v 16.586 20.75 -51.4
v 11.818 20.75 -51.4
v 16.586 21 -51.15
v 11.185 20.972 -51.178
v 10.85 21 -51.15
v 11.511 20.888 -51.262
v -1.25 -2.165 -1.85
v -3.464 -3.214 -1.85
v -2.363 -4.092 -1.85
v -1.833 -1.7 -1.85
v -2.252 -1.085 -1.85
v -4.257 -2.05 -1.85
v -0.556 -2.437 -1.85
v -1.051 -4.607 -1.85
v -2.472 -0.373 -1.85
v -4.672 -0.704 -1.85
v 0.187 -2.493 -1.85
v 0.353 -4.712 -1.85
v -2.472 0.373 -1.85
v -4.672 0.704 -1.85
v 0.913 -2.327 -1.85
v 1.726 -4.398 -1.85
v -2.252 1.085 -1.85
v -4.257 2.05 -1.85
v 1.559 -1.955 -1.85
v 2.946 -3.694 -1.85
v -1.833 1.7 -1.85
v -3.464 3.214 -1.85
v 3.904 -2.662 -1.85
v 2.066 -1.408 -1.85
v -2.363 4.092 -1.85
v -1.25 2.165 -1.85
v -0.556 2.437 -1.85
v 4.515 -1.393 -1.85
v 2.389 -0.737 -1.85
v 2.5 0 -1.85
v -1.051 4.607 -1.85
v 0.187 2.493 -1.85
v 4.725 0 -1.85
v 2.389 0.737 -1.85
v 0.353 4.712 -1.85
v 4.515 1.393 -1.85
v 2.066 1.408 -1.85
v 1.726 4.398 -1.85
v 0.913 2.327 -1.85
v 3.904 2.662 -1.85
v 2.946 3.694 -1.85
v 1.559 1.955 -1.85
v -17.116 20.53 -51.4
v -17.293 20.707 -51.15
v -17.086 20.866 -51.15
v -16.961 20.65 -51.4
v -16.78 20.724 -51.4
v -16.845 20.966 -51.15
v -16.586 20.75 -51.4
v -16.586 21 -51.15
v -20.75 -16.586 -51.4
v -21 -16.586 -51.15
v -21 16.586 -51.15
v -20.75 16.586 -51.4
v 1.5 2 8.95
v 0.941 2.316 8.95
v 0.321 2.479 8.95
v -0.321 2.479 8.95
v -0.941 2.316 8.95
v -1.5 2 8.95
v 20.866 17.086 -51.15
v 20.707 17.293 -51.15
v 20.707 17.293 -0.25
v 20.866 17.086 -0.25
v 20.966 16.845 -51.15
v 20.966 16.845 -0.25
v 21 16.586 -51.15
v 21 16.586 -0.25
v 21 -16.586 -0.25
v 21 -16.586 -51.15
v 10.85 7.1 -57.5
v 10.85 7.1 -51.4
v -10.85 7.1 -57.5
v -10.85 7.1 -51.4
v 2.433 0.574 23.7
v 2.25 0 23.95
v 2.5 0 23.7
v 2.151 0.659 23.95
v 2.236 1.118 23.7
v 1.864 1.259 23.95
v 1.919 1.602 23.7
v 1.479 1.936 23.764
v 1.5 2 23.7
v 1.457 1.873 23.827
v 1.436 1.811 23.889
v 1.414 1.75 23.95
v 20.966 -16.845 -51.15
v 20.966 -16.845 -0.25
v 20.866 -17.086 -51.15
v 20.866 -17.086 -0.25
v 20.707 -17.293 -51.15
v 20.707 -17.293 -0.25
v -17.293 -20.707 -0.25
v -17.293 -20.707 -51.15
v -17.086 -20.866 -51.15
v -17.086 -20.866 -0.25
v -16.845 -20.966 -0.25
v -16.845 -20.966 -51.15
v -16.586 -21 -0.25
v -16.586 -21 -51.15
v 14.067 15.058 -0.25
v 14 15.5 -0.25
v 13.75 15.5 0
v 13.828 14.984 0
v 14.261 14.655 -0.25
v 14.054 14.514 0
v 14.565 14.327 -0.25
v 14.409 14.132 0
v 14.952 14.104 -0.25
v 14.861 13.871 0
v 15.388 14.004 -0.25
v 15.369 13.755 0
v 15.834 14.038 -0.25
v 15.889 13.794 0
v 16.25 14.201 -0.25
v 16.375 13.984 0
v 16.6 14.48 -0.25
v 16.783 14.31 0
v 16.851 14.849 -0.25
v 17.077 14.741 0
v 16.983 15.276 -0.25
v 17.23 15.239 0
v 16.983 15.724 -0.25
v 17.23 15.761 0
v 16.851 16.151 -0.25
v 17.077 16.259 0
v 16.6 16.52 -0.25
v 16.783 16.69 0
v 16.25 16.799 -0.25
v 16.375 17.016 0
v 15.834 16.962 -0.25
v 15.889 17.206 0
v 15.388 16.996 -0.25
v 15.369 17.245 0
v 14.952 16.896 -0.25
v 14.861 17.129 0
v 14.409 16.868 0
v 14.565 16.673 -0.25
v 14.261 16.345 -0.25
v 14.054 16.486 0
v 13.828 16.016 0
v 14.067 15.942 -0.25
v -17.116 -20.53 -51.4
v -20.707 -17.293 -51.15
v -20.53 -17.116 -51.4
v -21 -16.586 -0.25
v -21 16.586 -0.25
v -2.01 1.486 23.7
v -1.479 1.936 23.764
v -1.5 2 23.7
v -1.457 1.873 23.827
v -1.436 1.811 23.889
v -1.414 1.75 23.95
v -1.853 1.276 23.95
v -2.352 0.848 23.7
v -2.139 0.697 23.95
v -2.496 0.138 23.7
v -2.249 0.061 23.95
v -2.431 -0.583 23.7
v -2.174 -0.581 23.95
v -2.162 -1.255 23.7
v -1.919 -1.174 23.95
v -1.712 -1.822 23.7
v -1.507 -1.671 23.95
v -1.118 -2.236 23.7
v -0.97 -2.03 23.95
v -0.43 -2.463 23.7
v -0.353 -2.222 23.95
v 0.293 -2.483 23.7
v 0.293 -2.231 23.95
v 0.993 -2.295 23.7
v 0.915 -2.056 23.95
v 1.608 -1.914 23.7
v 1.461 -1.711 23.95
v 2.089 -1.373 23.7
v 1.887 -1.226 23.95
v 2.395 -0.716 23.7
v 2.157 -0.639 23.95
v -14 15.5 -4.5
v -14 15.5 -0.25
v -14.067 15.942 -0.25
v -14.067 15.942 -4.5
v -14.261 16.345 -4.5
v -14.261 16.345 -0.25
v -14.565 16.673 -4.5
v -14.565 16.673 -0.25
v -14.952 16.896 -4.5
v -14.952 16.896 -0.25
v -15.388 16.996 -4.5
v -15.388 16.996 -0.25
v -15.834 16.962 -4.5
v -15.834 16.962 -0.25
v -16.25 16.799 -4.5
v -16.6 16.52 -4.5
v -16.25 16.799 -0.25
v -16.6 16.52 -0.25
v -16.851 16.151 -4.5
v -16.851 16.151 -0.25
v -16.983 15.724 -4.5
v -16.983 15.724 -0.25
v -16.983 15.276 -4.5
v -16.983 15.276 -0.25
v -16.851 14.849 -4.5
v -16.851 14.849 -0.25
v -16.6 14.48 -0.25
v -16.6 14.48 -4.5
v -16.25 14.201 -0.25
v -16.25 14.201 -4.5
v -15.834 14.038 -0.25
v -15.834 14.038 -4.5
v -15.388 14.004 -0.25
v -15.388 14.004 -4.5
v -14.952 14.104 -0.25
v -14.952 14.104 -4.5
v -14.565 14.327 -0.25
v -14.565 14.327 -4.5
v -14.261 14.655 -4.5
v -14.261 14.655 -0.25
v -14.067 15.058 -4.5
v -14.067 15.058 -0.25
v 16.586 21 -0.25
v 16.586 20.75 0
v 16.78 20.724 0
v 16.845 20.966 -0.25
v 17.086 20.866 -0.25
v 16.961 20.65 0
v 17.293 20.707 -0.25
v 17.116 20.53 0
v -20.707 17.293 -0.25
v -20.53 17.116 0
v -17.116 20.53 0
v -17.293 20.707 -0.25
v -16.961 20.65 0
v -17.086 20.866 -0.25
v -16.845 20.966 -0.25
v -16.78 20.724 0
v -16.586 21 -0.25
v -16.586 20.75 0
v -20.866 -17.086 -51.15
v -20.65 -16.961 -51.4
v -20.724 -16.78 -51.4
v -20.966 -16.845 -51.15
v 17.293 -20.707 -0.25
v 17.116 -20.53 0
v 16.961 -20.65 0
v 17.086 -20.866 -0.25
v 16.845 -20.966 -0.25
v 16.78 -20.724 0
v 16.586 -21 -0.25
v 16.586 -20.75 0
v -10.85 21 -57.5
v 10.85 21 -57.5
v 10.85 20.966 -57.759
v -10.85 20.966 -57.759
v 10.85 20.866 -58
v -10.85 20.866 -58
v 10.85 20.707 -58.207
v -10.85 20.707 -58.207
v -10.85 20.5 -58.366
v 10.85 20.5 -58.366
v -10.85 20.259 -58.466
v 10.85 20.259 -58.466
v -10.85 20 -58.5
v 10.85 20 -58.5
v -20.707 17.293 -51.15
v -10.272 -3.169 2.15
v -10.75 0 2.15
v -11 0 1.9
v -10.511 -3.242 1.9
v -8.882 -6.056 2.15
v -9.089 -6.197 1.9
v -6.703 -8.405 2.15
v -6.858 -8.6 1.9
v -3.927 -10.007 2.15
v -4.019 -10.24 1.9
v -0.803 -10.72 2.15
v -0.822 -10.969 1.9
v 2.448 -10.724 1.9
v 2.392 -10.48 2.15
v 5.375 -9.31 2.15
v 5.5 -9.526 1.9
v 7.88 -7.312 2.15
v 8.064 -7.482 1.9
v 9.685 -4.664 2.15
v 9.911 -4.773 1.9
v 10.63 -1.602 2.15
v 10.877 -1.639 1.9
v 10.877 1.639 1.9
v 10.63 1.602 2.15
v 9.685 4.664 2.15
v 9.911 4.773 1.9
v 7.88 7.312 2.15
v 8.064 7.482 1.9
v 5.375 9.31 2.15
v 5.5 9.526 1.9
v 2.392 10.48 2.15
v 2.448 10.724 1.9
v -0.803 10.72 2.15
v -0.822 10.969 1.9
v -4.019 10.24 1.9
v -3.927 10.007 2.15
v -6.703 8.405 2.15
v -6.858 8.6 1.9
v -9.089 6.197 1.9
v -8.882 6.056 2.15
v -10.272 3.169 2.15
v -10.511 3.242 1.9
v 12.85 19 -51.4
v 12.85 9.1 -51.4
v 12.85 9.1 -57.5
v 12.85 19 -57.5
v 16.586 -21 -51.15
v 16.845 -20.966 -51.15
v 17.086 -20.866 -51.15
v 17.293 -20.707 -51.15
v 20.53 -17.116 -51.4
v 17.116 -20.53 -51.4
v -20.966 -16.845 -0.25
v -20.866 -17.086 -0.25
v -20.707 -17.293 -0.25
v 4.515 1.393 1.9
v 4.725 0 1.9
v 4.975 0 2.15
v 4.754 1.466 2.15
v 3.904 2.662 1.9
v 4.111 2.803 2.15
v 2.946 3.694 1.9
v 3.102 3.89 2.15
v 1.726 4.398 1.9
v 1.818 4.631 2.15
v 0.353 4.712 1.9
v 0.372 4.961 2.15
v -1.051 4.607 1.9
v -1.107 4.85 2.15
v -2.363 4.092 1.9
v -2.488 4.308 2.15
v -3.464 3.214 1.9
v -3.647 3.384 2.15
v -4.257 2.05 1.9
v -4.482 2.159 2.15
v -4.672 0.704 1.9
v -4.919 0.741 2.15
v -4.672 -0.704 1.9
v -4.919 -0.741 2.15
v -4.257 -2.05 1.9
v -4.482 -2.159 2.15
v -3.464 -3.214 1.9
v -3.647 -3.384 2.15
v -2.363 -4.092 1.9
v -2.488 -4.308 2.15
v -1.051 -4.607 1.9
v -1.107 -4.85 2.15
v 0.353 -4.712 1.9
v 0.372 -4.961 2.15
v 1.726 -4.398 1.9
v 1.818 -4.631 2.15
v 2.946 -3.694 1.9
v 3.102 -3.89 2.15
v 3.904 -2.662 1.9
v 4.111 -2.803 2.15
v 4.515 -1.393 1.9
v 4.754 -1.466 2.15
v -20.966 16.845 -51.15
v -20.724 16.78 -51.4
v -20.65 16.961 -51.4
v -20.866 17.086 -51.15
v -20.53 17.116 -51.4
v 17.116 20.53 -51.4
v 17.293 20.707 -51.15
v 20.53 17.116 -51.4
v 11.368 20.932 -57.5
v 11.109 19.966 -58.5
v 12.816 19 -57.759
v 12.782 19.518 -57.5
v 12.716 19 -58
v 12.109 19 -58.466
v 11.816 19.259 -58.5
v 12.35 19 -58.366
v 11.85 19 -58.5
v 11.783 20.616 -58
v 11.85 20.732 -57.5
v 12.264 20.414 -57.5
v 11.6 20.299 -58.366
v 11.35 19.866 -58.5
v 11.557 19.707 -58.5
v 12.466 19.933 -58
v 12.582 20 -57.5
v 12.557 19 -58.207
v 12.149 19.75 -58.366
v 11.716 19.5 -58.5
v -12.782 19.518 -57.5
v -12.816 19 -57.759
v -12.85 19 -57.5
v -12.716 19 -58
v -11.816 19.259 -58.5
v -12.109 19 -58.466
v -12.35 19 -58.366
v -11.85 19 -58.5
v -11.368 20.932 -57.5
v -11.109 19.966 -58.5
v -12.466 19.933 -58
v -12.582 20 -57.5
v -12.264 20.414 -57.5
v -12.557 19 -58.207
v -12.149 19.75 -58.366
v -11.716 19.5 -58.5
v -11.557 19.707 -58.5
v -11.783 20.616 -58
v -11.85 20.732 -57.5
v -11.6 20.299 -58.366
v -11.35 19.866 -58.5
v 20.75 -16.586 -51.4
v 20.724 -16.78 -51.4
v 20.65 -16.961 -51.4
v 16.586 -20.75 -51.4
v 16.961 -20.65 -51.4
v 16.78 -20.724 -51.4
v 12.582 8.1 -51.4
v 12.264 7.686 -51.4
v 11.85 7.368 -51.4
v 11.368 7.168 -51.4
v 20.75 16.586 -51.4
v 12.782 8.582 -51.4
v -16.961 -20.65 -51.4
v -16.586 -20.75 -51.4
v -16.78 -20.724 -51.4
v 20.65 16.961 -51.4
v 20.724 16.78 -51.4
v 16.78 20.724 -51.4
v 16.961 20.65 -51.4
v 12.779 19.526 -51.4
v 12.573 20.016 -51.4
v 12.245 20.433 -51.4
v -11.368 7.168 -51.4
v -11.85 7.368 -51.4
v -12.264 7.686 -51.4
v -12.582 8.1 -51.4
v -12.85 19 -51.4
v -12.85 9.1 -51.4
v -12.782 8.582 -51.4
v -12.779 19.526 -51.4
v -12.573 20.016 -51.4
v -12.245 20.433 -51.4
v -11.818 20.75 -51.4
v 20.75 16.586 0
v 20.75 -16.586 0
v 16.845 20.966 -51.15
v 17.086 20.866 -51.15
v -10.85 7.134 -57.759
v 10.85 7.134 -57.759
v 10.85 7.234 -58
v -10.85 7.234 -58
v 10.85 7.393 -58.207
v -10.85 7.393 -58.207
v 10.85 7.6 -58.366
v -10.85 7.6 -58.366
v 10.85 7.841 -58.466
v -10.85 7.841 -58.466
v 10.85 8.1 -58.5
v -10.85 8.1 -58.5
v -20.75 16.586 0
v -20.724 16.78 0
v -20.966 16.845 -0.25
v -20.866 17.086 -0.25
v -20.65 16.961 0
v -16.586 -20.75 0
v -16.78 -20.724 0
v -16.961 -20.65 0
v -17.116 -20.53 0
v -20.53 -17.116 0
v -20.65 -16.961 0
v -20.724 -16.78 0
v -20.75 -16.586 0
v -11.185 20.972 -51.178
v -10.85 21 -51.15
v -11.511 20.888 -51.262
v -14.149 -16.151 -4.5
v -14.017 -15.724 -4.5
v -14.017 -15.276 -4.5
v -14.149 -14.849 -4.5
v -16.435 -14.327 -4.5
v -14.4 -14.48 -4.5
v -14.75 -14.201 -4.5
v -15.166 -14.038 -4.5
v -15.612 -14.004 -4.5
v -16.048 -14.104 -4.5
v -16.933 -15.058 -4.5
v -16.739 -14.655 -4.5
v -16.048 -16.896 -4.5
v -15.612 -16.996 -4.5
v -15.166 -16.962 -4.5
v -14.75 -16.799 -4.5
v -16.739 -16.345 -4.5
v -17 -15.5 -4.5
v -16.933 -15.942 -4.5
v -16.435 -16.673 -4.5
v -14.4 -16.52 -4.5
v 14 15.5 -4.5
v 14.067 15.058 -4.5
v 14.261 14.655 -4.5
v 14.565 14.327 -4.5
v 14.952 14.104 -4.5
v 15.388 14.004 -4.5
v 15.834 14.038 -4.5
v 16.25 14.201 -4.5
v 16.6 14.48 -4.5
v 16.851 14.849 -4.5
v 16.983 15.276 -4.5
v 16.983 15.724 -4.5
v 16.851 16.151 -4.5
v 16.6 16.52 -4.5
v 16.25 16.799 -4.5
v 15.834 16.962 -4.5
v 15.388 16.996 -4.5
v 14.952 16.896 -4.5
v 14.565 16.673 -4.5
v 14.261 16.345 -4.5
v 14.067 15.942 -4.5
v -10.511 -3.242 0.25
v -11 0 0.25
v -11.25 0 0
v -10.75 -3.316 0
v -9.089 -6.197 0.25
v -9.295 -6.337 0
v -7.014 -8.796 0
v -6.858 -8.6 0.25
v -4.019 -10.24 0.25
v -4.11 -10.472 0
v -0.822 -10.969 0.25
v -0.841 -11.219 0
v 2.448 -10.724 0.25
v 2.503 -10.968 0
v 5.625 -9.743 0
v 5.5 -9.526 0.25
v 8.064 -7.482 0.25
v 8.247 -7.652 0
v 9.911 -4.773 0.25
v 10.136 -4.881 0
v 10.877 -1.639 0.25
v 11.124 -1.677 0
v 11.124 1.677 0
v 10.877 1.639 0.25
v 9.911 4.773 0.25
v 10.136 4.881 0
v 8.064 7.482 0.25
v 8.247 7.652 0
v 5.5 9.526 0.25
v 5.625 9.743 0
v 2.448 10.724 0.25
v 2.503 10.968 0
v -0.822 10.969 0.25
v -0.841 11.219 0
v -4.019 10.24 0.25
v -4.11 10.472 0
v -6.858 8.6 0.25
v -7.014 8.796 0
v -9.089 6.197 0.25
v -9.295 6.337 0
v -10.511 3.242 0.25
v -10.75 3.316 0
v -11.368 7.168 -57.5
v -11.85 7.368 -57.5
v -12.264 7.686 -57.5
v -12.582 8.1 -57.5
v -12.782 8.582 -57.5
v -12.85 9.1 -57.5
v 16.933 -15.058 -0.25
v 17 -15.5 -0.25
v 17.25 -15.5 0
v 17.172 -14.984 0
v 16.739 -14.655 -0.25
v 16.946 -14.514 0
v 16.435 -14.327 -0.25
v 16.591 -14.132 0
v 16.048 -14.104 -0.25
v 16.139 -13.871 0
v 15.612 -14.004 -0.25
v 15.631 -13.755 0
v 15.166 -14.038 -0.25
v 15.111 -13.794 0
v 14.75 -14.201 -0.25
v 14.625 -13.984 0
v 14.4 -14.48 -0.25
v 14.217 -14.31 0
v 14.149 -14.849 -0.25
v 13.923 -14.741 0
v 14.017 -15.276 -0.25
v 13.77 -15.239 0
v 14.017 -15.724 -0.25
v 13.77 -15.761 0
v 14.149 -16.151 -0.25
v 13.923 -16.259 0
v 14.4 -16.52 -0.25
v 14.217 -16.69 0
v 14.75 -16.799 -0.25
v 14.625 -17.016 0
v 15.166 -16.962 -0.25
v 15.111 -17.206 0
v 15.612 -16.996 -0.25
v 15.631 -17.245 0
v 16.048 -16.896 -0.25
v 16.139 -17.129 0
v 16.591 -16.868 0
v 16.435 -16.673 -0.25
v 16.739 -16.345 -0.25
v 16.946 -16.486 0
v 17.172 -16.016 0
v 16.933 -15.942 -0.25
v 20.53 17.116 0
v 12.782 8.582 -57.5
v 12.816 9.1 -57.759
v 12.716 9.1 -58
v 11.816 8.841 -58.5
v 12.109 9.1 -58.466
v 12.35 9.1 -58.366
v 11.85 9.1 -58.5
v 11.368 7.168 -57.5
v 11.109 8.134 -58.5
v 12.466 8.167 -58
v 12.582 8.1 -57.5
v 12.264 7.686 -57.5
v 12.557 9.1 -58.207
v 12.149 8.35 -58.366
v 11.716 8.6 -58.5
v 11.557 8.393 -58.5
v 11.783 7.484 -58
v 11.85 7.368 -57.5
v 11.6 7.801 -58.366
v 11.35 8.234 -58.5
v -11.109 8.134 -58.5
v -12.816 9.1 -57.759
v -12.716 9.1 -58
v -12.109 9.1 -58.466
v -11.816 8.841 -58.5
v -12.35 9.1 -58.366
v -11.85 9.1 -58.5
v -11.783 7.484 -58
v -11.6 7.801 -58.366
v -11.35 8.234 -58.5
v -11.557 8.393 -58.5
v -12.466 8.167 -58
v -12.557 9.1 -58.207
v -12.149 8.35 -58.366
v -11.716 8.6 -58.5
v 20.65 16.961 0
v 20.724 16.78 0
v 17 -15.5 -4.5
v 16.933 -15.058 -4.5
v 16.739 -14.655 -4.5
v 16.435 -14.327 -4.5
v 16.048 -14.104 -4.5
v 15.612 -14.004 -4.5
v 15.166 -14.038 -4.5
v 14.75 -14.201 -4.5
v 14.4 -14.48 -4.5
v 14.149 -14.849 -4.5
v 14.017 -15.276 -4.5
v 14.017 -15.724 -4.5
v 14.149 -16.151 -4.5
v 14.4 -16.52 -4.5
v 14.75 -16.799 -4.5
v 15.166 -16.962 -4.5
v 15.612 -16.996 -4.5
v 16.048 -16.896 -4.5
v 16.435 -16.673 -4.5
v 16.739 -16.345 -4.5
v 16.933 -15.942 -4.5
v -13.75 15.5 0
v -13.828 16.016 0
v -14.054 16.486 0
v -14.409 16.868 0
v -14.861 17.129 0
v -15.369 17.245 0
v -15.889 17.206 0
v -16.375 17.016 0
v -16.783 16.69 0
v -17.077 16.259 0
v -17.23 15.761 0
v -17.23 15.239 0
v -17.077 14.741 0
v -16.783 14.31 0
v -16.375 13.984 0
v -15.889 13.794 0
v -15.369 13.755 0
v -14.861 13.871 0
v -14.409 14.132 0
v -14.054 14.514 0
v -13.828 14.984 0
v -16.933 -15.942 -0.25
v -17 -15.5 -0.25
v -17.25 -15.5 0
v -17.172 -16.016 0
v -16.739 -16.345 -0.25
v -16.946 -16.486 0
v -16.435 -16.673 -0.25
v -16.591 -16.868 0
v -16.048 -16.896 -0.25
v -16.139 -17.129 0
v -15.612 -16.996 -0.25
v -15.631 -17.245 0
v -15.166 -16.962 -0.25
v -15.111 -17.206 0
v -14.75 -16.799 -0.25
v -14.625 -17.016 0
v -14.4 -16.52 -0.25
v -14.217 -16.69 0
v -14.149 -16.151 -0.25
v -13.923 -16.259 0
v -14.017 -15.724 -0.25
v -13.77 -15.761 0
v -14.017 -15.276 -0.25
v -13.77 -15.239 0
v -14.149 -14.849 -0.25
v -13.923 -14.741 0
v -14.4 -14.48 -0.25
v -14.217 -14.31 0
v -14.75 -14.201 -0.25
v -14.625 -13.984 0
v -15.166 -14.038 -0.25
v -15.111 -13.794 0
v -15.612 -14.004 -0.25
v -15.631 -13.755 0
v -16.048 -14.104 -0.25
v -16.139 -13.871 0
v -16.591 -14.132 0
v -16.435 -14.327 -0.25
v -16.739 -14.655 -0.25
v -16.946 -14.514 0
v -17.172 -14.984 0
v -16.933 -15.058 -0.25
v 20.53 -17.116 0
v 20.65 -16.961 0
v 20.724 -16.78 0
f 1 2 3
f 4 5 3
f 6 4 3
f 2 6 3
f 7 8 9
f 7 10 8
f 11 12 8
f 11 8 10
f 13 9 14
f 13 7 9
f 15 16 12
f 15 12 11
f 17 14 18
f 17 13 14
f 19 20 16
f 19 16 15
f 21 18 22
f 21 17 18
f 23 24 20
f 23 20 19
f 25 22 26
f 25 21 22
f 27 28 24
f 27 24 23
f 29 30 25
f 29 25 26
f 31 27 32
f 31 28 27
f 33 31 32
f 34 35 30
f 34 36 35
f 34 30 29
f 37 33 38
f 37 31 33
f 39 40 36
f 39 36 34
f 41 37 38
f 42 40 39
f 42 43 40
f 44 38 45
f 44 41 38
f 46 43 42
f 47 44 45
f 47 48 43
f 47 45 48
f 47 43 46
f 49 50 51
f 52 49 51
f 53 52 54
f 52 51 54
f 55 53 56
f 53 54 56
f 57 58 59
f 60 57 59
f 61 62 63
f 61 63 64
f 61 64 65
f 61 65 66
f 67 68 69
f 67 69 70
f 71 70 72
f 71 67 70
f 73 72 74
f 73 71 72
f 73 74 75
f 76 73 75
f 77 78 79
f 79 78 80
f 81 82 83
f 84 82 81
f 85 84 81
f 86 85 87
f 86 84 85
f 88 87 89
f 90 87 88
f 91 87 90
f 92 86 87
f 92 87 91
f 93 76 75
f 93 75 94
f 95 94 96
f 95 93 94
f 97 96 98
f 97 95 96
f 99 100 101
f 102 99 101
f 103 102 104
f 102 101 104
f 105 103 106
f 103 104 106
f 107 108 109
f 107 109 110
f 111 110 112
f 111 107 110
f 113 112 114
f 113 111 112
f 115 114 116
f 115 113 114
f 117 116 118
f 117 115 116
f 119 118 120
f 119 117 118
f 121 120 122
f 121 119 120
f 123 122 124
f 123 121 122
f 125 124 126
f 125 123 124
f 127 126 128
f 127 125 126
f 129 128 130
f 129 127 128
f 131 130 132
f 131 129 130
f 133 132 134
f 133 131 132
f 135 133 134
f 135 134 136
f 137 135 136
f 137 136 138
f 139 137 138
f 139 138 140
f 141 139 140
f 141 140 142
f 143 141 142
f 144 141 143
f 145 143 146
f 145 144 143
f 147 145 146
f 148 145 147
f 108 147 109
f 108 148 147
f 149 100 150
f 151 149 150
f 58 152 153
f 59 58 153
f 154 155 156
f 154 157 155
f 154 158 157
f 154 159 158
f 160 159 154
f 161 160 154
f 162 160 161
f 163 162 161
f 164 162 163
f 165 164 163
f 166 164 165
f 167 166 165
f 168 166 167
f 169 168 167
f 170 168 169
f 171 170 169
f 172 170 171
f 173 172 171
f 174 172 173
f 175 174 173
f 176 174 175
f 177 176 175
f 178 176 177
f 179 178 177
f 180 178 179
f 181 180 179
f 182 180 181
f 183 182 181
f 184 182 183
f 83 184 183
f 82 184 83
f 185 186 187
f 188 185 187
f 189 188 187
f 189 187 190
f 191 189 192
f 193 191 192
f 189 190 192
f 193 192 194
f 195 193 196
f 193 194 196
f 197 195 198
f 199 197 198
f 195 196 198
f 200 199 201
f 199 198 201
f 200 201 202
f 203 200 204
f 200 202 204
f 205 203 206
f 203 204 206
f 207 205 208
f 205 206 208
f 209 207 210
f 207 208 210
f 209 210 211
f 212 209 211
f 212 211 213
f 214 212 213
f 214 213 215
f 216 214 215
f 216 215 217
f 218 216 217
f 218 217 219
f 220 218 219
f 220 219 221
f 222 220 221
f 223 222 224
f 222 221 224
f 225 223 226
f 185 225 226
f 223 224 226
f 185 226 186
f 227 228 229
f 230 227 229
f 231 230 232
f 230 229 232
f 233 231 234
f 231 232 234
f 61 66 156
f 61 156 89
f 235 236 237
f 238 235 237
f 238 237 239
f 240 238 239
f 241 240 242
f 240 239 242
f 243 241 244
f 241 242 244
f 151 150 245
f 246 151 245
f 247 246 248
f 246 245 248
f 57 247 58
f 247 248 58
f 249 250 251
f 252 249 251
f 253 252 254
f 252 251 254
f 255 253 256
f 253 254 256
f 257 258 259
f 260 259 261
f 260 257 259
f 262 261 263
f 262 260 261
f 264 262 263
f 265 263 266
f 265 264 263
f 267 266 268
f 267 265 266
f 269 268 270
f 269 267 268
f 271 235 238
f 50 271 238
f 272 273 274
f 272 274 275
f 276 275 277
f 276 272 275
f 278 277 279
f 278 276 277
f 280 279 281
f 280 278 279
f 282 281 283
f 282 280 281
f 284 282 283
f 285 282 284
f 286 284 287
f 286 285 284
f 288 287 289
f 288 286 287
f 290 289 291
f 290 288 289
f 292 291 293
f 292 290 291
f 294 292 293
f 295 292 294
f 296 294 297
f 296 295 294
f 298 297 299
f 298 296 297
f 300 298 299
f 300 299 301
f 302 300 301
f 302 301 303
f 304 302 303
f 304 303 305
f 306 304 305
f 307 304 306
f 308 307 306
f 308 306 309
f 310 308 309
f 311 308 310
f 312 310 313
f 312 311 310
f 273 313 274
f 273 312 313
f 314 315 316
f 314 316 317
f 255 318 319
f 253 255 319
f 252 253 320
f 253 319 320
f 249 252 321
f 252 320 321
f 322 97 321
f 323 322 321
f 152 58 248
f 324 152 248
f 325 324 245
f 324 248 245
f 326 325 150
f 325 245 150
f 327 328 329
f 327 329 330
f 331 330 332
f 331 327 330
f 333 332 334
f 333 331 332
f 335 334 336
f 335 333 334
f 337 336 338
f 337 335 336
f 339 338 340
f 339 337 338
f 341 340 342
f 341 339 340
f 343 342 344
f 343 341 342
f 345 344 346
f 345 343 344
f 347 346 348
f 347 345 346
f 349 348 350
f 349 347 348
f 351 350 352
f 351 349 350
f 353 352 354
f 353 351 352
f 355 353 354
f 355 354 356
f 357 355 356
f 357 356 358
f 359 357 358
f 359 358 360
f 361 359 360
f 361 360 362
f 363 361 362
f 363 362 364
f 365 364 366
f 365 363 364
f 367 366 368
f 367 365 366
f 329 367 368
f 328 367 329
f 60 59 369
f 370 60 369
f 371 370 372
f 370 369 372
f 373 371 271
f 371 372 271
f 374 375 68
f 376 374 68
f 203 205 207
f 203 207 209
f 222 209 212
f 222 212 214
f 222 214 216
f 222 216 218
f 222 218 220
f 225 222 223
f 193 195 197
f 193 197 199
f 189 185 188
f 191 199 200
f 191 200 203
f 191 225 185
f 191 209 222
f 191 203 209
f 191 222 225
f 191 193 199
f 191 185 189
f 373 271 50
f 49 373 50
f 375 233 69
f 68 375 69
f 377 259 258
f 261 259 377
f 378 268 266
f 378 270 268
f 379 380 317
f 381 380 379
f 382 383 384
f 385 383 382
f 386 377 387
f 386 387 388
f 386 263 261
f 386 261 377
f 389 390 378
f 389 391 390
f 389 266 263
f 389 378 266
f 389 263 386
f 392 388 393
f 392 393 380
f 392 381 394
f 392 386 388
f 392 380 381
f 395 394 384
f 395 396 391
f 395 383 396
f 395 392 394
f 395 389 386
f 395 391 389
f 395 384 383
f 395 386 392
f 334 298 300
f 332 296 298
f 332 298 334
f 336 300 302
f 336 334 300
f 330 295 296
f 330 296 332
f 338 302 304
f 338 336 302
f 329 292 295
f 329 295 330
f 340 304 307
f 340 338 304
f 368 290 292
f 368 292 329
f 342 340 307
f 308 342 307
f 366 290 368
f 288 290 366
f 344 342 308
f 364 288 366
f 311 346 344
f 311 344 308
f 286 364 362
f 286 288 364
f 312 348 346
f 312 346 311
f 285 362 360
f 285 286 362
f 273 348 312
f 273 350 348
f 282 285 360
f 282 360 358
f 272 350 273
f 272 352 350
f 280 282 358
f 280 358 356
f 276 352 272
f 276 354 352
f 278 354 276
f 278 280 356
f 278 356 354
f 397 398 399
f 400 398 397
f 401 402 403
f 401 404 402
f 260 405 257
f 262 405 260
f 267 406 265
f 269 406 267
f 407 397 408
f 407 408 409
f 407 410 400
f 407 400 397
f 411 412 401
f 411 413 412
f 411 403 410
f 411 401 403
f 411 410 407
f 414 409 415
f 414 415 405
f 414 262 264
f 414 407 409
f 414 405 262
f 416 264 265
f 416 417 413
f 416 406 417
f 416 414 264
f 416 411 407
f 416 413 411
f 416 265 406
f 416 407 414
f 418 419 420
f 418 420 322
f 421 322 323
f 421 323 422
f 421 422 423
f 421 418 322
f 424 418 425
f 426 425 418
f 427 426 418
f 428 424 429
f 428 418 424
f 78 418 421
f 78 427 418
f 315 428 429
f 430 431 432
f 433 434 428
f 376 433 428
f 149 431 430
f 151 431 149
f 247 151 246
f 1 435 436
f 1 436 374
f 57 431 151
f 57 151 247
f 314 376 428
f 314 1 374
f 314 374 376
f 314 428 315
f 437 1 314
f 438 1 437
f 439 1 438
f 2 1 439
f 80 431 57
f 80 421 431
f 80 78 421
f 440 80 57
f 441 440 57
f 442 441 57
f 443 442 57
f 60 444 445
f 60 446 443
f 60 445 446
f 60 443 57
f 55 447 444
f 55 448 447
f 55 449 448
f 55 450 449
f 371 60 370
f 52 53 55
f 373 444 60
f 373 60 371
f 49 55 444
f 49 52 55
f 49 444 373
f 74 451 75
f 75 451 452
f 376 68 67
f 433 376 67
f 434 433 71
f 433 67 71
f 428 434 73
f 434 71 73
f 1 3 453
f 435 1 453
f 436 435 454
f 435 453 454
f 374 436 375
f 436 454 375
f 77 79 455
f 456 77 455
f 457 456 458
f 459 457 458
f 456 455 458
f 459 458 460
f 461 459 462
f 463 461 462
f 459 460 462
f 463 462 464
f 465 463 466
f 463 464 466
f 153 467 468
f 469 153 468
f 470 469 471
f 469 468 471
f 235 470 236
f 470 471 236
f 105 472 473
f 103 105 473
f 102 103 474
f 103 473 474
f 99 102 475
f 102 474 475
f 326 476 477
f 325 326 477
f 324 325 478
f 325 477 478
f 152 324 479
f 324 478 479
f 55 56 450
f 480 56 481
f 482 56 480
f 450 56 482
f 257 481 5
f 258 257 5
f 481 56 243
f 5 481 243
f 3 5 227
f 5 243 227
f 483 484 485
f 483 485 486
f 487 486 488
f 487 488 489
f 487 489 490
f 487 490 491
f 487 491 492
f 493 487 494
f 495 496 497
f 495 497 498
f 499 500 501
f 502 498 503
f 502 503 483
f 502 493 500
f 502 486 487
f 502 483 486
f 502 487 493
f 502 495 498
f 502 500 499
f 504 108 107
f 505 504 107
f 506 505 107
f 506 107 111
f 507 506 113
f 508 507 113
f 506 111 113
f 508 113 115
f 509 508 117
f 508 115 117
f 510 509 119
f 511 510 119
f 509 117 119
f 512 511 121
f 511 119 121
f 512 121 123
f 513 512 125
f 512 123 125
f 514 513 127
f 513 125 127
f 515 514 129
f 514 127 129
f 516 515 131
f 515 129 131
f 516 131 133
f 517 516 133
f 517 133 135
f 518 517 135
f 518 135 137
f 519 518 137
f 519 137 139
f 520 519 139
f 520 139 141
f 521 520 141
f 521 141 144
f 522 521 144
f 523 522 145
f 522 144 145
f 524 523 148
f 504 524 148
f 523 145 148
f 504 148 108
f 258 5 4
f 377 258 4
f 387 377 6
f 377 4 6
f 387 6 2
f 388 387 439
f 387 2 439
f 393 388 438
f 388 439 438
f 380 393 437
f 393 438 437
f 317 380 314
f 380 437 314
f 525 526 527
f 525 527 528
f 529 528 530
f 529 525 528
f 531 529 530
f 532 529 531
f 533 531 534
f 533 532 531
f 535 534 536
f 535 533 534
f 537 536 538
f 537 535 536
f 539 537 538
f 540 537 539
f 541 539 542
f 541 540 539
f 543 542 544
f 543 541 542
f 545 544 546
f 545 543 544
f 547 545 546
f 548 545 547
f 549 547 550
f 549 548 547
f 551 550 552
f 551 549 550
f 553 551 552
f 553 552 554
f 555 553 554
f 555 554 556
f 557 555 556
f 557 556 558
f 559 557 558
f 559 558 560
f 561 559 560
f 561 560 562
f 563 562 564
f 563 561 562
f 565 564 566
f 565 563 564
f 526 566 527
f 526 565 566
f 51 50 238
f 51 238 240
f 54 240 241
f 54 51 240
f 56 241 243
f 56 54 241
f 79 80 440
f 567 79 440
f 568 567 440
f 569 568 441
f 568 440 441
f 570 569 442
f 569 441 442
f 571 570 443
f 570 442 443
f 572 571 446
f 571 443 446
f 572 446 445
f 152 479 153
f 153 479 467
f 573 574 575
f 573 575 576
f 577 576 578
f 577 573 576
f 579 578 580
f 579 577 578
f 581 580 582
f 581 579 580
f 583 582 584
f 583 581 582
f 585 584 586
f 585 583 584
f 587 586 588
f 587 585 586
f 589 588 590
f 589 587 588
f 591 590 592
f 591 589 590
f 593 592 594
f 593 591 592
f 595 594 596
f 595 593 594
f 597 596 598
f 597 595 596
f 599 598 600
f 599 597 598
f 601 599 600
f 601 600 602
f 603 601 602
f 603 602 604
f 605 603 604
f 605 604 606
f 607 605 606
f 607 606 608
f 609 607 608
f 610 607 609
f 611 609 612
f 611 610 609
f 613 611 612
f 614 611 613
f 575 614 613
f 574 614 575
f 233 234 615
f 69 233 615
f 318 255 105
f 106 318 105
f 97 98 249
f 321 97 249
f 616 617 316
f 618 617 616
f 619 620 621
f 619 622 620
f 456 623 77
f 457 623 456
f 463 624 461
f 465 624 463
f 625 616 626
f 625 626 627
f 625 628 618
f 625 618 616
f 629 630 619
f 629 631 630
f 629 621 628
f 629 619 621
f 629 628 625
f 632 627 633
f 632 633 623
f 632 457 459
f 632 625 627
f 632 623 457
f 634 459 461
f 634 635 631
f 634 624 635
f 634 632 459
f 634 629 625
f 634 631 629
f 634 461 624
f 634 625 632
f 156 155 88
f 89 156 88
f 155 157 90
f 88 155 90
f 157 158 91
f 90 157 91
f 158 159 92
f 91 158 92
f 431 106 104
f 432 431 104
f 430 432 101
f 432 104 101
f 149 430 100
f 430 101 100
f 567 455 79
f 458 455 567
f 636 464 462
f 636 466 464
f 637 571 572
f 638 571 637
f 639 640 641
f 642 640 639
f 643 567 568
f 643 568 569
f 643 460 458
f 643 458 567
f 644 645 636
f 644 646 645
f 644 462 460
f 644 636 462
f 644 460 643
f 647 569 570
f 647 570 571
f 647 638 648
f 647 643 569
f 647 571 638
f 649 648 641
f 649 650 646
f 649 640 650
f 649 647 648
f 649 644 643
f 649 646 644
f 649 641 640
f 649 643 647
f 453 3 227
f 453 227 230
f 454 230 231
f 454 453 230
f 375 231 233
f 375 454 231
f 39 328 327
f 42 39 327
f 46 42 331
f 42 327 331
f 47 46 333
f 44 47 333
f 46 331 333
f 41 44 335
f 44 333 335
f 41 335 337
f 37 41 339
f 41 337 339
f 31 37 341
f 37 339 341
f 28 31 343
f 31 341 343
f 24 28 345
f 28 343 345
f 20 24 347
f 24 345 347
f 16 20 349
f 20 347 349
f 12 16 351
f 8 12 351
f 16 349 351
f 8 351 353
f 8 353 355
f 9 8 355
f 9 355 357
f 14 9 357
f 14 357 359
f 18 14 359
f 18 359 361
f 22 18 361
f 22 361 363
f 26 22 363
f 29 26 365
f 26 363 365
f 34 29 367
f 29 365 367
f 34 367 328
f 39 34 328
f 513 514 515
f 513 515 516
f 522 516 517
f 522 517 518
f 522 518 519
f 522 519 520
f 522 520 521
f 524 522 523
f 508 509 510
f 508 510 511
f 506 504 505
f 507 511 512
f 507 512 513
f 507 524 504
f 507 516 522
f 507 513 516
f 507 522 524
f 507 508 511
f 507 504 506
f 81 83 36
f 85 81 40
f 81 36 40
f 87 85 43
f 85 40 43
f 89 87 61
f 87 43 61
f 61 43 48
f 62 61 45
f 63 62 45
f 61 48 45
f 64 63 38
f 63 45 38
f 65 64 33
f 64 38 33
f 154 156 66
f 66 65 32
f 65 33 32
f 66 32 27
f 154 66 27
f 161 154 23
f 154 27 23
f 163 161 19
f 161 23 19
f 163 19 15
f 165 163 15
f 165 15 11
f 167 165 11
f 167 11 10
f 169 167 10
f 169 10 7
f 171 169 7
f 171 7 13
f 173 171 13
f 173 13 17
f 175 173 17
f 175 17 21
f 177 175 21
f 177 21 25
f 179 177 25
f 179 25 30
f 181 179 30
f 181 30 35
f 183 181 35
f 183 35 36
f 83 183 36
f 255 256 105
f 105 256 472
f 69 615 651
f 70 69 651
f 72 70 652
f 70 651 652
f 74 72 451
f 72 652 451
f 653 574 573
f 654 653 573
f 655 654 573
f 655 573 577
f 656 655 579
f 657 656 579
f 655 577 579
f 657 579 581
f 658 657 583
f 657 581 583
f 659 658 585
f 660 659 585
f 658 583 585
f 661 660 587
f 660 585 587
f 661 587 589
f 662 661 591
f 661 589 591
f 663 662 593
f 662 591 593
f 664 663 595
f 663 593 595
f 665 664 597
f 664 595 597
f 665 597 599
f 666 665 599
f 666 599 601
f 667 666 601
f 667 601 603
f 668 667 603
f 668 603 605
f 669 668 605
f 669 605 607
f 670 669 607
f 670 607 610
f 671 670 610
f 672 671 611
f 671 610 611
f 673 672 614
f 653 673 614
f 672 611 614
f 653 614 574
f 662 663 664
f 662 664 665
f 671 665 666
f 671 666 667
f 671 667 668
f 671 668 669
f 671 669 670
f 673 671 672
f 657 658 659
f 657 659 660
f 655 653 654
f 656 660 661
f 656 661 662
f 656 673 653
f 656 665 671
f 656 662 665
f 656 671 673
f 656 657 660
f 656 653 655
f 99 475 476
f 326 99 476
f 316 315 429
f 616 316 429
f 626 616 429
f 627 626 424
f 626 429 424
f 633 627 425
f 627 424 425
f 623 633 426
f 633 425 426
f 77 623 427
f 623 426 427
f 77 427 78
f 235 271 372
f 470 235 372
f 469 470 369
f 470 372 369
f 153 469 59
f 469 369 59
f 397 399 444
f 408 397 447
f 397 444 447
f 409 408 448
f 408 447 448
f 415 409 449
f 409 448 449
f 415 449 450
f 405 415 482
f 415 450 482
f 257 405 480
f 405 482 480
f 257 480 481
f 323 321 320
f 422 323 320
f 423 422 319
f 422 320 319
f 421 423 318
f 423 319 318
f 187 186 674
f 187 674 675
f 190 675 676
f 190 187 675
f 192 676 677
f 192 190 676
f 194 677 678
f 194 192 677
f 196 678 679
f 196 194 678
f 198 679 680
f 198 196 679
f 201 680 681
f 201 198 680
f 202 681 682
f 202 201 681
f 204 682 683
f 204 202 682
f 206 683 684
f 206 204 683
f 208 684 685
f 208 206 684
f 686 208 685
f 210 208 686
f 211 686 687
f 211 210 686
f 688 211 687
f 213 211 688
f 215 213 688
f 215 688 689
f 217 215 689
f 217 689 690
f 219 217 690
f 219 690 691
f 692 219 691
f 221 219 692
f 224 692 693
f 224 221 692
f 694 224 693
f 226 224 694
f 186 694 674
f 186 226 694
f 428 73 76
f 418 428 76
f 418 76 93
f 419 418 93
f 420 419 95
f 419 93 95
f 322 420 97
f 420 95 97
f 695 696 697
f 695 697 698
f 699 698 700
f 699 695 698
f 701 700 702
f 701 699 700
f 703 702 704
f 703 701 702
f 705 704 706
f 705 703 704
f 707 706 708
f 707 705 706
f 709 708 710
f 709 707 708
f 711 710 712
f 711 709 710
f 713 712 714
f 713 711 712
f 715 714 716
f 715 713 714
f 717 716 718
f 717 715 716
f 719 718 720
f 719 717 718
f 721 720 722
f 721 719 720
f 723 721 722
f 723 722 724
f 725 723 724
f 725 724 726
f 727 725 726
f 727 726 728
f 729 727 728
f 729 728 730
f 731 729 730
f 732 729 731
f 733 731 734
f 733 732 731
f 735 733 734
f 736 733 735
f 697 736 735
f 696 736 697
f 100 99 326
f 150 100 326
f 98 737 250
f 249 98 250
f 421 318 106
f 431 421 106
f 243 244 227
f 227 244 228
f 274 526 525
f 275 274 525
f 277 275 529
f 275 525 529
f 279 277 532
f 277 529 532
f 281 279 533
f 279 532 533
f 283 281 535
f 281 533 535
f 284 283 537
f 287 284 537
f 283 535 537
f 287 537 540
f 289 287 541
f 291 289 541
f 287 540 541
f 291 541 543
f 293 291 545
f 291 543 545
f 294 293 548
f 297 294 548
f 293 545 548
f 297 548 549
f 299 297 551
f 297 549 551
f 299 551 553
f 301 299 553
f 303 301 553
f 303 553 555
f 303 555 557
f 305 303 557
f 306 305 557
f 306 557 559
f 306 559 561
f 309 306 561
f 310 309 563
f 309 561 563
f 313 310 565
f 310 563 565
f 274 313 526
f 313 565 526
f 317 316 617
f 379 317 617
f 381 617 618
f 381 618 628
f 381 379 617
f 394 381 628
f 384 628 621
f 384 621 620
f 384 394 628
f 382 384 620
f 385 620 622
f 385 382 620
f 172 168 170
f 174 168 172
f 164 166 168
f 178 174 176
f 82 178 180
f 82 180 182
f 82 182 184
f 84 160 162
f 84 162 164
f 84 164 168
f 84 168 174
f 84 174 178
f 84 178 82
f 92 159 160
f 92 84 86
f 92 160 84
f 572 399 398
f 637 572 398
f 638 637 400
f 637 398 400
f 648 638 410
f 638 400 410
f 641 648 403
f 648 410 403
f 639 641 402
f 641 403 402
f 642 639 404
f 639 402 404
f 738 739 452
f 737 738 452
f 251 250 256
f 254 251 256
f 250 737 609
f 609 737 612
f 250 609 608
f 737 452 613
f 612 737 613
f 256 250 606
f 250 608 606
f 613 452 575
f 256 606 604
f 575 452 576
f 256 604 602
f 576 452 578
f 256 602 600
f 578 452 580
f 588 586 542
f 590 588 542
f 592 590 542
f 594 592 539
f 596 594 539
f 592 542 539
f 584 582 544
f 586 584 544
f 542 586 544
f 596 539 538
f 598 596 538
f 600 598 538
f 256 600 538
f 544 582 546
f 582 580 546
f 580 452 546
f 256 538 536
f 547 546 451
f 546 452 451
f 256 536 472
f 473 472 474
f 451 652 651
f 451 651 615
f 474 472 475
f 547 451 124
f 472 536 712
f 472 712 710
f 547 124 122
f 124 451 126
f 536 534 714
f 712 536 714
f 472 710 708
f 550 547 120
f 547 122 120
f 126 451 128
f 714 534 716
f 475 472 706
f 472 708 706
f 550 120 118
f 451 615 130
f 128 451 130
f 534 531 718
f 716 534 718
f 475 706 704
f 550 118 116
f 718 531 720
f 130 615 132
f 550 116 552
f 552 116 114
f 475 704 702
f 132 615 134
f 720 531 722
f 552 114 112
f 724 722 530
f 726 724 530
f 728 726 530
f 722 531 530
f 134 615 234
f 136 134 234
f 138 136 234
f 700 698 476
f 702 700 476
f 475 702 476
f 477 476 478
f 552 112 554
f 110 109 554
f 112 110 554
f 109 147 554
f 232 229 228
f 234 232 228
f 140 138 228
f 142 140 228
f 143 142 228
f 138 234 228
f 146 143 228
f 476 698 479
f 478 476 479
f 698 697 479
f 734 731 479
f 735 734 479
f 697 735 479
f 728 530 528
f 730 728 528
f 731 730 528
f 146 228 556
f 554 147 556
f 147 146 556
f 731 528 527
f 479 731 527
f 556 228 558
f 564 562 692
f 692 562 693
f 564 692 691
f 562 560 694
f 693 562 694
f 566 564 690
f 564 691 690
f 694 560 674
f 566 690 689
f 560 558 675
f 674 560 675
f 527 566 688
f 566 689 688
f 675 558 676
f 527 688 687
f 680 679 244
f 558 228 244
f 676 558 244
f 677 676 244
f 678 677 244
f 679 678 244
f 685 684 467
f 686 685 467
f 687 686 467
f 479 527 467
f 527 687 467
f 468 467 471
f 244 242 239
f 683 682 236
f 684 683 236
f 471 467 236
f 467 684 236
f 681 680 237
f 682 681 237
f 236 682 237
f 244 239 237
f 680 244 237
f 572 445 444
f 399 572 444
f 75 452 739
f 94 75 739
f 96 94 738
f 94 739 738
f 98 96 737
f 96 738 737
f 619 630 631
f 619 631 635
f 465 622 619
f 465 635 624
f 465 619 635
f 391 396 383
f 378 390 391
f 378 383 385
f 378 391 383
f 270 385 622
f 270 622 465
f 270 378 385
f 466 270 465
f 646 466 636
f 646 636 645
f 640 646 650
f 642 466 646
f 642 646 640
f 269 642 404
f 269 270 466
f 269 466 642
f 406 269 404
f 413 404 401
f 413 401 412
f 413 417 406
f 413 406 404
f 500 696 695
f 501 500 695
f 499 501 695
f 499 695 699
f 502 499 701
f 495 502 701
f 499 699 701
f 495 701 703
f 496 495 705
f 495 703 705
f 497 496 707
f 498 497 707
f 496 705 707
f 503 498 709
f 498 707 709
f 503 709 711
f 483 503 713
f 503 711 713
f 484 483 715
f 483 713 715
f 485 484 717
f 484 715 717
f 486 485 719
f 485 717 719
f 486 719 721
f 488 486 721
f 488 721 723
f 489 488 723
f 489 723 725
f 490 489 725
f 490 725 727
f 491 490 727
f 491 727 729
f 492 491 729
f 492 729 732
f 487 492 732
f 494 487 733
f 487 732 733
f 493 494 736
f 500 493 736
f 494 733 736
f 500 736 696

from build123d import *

# Parameters (mm, degrees)
BOSS_EXTRUDE1_DEPTH = 51.4
SKETCH2_R           = 1.5
CUT_EXTRUDE1_DEPTH  = 4.5
SKETCH3_R           = 11
BOSS_EXTRUDE2_DEPTH = 2.15
SKETCH5_R           = 4.725
CUT_EXTRUDE2_DEPTH  = 4
SKETCH4_R           = 2.5
BOSS_EXTRUDE3_DEPTH = 25.8
CUT_EXTRUDE3_START  = -15
CUT_EXTRUDE3_DEPTH  = 15
SKETCH7_W           = 25.7
SKETCH7_H           = 13.9
BOSS_EXTRUDE4_DEPTH = 7.1
FILLET1_R           = 1
FILLET2_R           = 2
CHAMFER1_SIZE       = 0.25


with BuildPart() as part:
    # Sketch1 → Boss-Extrude1 (new body)
    with BuildSketch(Plane.XY):
        Polygon((-21, 17), (-17, 21), (17, 21), (21, 17), (21, -17), (17, -21), (-17, -21), (-21, -17), align=None)
    extrude(amount=-BOSS_EXTRUDE1_DEPTH)

    # Sketch2 → Cut-Extrude1 (cut)
    with BuildSketch(Plane.XY):
        with Locations((-15.5, 15.5)):
            Circle(SKETCH2_R)
        with Locations(Location((15.5, 15.5, 0), (0, 0, 180))):
            Circle(SKETCH2_R)
        with Locations((15.5, -15.5)):
            Circle(SKETCH2_R)
        with Locations(Location((-15.5, -15.5, 0), (0, 0, 180))):
            Circle(SKETCH2_R)
    extrude(amount=-CUT_EXTRUDE1_DEPTH, mode=Mode.SUBTRACT)

    # Sketch3 → Boss-Extrude2 (add)
    with BuildSketch(Plane.XY):
        with Locations(Location((0, 0, 0), (0, 0, 180))):
            Circle(SKETCH3_R)
    extrude(amount=BOSS_EXTRUDE2_DEPTH)

    # Sketch5 → Cut-Extrude2 (cut)
    with BuildSketch(Plane.XY.offset(2.15)):
        Circle(SKETCH5_R)
    extrude(amount=-CUT_EXTRUDE2_DEPTH, mode=Mode.SUBTRACT)

    # Sketch4 → Boss-Extrude3 (add)
    with BuildSketch(Plane.XY.offset(-1.85)):
        Circle(SKETCH4_R)
    extrude(amount=BOSS_EXTRUDE3_DEPTH)

    # Sketch6 → Cut-Extrude3 (cut)
    with BuildSketch(Plane.XY.offset(23.95).offset(CUT_EXTRUDE3_START)):
        with BuildLine():
            Line((-1.5, 2), (1.5, 2))
            ThreePointArc((1.5, 2), (0, 2.5), (-1.5, 2))
        make_face()
    extrude(amount=CUT_EXTRUDE3_DEPTH, mode=Mode.SUBTRACT)

    # Sketch7 → Boss-Extrude4 (add)
    with BuildSketch(Plane(origin=(0, 0, -51.4), x_dir=(-1, 0, 0), z_dir=(0, 0, -1))):
        with Locations((0, 14.05)):
            Rectangle(SKETCH7_W, SKETCH7_H)
    extrude(amount=BOSS_EXTRUDE4_DEPTH)

    # Fillet1
    fillet1_edges = [part.edges().sort_by_distance(p)[0] for p in [
        (17, 21, -25.7),
        (21, 17, -25.7),
        (21, -17, -25.7),
        (17, -21, -25.7),
        (-17, -21, -25.7),
        (-21, -17, -25.7),
        (-21, 17, -25.7),
        (-17, 21, -25.7),
        (0, 7.1, -58.5),
        (-12.85, 14.05, -58.5),
        (0, 21, -58.5),
        (12.85, 14.05, -58.5),
    ]]
    fillet(fillet1_edges, radius=FILLET1_R)

    # Fillet2
    # the kernel refuses this fillet: 2 mm, written as the material it takes off along each edge
    with BuildSketch(Plane(origin=(-10.85, 19, -58.5), x_dir=(-1, 0, 0), z_dir=(0, -1, 0))) as fillet2_piece_1:
        with BuildLine():
            CenterArc((1, -1), 1, 0, 90)
            Line((2, -1), (2, 0))
            Line((2, 0), (1, 0))
        make_face()
    revolve(axis=Axis((-10.85, 19, -58.5), (0, 0, -1)), revolution_arc=90, mode=Mode.SUBTRACT)
    with BuildSketch(Plane(origin=(-10.85, 9.1, -58.5), x_dir=(0, -1, 0), z_dir=(1, 0, 0))) as fillet2_piece_2:
        with BuildLine():
            CenterArc((1, -1), 1, 0, 90)
            Line((2, -1), (2, 0))
            Line((2, 0), (1, 0))
        make_face()
    revolve(axis=Axis((-10.85, 9.1, -58.5), (0, 0, -1)), revolution_arc=90, mode=Mode.SUBTRACT)
    with BuildSketch(Plane(origin=(10.85, 19, -58.5), x_dir=(0, 1, 0), z_dir=(-1, 0, 0))) as fillet2_piece_3:
        with BuildLine():
            CenterArc((1, -1), 1, 0, 90)
            Line((2, -1), (2, 0))
            Line((2, 0), (1, 0))
        make_face()
    revolve(axis=Axis((10.85, 19, -58.5), (0, 0, -1)), revolution_arc=90, mode=Mode.SUBTRACT)
    with BuildSketch(Plane(origin=(10.85, 9.1, -58.5), x_dir=(1, 0, 0), z_dir=(0, 1, 0))) as fillet2_piece_4:
        with BuildLine():
            CenterArc((1, -1), 1, 0, 90)
            Line((2, -1), (2, 0))
            Line((2, 0), (1, 0))
        make_face()
    revolve(axis=Axis((10.85, 9.1, -58.5), (0, 0, -1)), revolution_arc=90, mode=Mode.SUBTRACT)
    with BuildSketch(Plane(origin=(12.85, 21, -51.4), x_dir=(-1, 0, 0), z_dir=(0, 0, -1))) as fillet2_piece_5:
        with BuildLine():
            CenterArc((FILLET2_R, -FILLET2_R), FILLET2_R, 90, 90)
            Line((0, -FILLET2_R), (0, 0))
            Line((0, 0), (FILLET2_R, 0))
        make_face()
    extrude(amount=7.1, mode=Mode.SUBTRACT)
    with BuildSketch(Plane(origin=(12.85, 7.1, -51.4), x_dir=(-1, 0, 0), z_dir=(0, 0, -1)), Plane(origin=(-12.85, 21, -51.4), x_dir=(1, 0, 0), z_dir=(0, 0, -1)), Plane(origin=(-12.85, 7.1, -51.4), x_dir=(0, 1, 0), z_dir=(0, 0, -1))) as fillet2_piece_6:
        with BuildLine():
            CenterArc((FILLET2_R, FILLET2_R), FILLET2_R, 180, 90)
            Line((0, FILLET2_R), (0, 0))
            Line((0, 0), (FILLET2_R, 0))
        make_face()
    extrude(amount=7.1, mode=Mode.SUBTRACT)

    # Chamfer1
    chamfer1_edges = [part.edges().sort_by_distance(p)[0] for p in [
        (16.96846987, 20.923879533, 0),
        (21, 0, -51.4),
        (19, -19, -51.4),
        (0, -21, -51.4),
        (-19, -19, -51.4),
        (-21, 0, -51.4),
        (-19, 19, -51.4),
        (-20.923879533, 16.96846987, -51.4),
        (-16.96846987, 20.923879533, -51.4),
        (-20.923879533, -16.96846987, -51.4),
        (-16.96846987, -20.923879533, -51.4),
        (16.96846987, -20.923879533, -51.4),
        (20.923879533, -16.96846987, -51.4),
        (20.923879533, 16.96846987, -51.4),
        (16.96846987, 20.923879533, -51.4),
        (-14, -15.5, 0),
        (14, -15.5, 0),
        (17, 15.5, 0),
        (-17, 15.5, 0),
        (11, 0, 0),
        (11, 0, 2.15),
        (-4.725, 0, 2.15),
        (-1.118033989, -2.236067977, 23.95),
        (0, 2, 23.95),
        (-13.717893219, 21, -51.4),
        (0, 21, 0),
        (13.717893219, 21, -51.4),
        (19, 19, 0),
        (19, 19, -51.4),
        (-19, 19, 0),
        (-21, 0, 0),
        (-19, -19, 0),
        (0, -21, 0),
        (19, -19, 0),
        (21, 0, 0),
        (-20.923879533, 16.96846987, 0),
        (-16.96846987, 20.923879533, 0),
        (-20.923879533, -16.96846987, 0),
        (-16.96846987, -20.923879533, 0),
        (16.96846987, -20.923879533, 0),
        (20.923879533, -16.96846987, 0),
        (20.923879533, 16.96846987, 0),
    ]]
    chamfer(chamfer1_edges, length=CHAMFER1_SIZE)


solid = part.part
